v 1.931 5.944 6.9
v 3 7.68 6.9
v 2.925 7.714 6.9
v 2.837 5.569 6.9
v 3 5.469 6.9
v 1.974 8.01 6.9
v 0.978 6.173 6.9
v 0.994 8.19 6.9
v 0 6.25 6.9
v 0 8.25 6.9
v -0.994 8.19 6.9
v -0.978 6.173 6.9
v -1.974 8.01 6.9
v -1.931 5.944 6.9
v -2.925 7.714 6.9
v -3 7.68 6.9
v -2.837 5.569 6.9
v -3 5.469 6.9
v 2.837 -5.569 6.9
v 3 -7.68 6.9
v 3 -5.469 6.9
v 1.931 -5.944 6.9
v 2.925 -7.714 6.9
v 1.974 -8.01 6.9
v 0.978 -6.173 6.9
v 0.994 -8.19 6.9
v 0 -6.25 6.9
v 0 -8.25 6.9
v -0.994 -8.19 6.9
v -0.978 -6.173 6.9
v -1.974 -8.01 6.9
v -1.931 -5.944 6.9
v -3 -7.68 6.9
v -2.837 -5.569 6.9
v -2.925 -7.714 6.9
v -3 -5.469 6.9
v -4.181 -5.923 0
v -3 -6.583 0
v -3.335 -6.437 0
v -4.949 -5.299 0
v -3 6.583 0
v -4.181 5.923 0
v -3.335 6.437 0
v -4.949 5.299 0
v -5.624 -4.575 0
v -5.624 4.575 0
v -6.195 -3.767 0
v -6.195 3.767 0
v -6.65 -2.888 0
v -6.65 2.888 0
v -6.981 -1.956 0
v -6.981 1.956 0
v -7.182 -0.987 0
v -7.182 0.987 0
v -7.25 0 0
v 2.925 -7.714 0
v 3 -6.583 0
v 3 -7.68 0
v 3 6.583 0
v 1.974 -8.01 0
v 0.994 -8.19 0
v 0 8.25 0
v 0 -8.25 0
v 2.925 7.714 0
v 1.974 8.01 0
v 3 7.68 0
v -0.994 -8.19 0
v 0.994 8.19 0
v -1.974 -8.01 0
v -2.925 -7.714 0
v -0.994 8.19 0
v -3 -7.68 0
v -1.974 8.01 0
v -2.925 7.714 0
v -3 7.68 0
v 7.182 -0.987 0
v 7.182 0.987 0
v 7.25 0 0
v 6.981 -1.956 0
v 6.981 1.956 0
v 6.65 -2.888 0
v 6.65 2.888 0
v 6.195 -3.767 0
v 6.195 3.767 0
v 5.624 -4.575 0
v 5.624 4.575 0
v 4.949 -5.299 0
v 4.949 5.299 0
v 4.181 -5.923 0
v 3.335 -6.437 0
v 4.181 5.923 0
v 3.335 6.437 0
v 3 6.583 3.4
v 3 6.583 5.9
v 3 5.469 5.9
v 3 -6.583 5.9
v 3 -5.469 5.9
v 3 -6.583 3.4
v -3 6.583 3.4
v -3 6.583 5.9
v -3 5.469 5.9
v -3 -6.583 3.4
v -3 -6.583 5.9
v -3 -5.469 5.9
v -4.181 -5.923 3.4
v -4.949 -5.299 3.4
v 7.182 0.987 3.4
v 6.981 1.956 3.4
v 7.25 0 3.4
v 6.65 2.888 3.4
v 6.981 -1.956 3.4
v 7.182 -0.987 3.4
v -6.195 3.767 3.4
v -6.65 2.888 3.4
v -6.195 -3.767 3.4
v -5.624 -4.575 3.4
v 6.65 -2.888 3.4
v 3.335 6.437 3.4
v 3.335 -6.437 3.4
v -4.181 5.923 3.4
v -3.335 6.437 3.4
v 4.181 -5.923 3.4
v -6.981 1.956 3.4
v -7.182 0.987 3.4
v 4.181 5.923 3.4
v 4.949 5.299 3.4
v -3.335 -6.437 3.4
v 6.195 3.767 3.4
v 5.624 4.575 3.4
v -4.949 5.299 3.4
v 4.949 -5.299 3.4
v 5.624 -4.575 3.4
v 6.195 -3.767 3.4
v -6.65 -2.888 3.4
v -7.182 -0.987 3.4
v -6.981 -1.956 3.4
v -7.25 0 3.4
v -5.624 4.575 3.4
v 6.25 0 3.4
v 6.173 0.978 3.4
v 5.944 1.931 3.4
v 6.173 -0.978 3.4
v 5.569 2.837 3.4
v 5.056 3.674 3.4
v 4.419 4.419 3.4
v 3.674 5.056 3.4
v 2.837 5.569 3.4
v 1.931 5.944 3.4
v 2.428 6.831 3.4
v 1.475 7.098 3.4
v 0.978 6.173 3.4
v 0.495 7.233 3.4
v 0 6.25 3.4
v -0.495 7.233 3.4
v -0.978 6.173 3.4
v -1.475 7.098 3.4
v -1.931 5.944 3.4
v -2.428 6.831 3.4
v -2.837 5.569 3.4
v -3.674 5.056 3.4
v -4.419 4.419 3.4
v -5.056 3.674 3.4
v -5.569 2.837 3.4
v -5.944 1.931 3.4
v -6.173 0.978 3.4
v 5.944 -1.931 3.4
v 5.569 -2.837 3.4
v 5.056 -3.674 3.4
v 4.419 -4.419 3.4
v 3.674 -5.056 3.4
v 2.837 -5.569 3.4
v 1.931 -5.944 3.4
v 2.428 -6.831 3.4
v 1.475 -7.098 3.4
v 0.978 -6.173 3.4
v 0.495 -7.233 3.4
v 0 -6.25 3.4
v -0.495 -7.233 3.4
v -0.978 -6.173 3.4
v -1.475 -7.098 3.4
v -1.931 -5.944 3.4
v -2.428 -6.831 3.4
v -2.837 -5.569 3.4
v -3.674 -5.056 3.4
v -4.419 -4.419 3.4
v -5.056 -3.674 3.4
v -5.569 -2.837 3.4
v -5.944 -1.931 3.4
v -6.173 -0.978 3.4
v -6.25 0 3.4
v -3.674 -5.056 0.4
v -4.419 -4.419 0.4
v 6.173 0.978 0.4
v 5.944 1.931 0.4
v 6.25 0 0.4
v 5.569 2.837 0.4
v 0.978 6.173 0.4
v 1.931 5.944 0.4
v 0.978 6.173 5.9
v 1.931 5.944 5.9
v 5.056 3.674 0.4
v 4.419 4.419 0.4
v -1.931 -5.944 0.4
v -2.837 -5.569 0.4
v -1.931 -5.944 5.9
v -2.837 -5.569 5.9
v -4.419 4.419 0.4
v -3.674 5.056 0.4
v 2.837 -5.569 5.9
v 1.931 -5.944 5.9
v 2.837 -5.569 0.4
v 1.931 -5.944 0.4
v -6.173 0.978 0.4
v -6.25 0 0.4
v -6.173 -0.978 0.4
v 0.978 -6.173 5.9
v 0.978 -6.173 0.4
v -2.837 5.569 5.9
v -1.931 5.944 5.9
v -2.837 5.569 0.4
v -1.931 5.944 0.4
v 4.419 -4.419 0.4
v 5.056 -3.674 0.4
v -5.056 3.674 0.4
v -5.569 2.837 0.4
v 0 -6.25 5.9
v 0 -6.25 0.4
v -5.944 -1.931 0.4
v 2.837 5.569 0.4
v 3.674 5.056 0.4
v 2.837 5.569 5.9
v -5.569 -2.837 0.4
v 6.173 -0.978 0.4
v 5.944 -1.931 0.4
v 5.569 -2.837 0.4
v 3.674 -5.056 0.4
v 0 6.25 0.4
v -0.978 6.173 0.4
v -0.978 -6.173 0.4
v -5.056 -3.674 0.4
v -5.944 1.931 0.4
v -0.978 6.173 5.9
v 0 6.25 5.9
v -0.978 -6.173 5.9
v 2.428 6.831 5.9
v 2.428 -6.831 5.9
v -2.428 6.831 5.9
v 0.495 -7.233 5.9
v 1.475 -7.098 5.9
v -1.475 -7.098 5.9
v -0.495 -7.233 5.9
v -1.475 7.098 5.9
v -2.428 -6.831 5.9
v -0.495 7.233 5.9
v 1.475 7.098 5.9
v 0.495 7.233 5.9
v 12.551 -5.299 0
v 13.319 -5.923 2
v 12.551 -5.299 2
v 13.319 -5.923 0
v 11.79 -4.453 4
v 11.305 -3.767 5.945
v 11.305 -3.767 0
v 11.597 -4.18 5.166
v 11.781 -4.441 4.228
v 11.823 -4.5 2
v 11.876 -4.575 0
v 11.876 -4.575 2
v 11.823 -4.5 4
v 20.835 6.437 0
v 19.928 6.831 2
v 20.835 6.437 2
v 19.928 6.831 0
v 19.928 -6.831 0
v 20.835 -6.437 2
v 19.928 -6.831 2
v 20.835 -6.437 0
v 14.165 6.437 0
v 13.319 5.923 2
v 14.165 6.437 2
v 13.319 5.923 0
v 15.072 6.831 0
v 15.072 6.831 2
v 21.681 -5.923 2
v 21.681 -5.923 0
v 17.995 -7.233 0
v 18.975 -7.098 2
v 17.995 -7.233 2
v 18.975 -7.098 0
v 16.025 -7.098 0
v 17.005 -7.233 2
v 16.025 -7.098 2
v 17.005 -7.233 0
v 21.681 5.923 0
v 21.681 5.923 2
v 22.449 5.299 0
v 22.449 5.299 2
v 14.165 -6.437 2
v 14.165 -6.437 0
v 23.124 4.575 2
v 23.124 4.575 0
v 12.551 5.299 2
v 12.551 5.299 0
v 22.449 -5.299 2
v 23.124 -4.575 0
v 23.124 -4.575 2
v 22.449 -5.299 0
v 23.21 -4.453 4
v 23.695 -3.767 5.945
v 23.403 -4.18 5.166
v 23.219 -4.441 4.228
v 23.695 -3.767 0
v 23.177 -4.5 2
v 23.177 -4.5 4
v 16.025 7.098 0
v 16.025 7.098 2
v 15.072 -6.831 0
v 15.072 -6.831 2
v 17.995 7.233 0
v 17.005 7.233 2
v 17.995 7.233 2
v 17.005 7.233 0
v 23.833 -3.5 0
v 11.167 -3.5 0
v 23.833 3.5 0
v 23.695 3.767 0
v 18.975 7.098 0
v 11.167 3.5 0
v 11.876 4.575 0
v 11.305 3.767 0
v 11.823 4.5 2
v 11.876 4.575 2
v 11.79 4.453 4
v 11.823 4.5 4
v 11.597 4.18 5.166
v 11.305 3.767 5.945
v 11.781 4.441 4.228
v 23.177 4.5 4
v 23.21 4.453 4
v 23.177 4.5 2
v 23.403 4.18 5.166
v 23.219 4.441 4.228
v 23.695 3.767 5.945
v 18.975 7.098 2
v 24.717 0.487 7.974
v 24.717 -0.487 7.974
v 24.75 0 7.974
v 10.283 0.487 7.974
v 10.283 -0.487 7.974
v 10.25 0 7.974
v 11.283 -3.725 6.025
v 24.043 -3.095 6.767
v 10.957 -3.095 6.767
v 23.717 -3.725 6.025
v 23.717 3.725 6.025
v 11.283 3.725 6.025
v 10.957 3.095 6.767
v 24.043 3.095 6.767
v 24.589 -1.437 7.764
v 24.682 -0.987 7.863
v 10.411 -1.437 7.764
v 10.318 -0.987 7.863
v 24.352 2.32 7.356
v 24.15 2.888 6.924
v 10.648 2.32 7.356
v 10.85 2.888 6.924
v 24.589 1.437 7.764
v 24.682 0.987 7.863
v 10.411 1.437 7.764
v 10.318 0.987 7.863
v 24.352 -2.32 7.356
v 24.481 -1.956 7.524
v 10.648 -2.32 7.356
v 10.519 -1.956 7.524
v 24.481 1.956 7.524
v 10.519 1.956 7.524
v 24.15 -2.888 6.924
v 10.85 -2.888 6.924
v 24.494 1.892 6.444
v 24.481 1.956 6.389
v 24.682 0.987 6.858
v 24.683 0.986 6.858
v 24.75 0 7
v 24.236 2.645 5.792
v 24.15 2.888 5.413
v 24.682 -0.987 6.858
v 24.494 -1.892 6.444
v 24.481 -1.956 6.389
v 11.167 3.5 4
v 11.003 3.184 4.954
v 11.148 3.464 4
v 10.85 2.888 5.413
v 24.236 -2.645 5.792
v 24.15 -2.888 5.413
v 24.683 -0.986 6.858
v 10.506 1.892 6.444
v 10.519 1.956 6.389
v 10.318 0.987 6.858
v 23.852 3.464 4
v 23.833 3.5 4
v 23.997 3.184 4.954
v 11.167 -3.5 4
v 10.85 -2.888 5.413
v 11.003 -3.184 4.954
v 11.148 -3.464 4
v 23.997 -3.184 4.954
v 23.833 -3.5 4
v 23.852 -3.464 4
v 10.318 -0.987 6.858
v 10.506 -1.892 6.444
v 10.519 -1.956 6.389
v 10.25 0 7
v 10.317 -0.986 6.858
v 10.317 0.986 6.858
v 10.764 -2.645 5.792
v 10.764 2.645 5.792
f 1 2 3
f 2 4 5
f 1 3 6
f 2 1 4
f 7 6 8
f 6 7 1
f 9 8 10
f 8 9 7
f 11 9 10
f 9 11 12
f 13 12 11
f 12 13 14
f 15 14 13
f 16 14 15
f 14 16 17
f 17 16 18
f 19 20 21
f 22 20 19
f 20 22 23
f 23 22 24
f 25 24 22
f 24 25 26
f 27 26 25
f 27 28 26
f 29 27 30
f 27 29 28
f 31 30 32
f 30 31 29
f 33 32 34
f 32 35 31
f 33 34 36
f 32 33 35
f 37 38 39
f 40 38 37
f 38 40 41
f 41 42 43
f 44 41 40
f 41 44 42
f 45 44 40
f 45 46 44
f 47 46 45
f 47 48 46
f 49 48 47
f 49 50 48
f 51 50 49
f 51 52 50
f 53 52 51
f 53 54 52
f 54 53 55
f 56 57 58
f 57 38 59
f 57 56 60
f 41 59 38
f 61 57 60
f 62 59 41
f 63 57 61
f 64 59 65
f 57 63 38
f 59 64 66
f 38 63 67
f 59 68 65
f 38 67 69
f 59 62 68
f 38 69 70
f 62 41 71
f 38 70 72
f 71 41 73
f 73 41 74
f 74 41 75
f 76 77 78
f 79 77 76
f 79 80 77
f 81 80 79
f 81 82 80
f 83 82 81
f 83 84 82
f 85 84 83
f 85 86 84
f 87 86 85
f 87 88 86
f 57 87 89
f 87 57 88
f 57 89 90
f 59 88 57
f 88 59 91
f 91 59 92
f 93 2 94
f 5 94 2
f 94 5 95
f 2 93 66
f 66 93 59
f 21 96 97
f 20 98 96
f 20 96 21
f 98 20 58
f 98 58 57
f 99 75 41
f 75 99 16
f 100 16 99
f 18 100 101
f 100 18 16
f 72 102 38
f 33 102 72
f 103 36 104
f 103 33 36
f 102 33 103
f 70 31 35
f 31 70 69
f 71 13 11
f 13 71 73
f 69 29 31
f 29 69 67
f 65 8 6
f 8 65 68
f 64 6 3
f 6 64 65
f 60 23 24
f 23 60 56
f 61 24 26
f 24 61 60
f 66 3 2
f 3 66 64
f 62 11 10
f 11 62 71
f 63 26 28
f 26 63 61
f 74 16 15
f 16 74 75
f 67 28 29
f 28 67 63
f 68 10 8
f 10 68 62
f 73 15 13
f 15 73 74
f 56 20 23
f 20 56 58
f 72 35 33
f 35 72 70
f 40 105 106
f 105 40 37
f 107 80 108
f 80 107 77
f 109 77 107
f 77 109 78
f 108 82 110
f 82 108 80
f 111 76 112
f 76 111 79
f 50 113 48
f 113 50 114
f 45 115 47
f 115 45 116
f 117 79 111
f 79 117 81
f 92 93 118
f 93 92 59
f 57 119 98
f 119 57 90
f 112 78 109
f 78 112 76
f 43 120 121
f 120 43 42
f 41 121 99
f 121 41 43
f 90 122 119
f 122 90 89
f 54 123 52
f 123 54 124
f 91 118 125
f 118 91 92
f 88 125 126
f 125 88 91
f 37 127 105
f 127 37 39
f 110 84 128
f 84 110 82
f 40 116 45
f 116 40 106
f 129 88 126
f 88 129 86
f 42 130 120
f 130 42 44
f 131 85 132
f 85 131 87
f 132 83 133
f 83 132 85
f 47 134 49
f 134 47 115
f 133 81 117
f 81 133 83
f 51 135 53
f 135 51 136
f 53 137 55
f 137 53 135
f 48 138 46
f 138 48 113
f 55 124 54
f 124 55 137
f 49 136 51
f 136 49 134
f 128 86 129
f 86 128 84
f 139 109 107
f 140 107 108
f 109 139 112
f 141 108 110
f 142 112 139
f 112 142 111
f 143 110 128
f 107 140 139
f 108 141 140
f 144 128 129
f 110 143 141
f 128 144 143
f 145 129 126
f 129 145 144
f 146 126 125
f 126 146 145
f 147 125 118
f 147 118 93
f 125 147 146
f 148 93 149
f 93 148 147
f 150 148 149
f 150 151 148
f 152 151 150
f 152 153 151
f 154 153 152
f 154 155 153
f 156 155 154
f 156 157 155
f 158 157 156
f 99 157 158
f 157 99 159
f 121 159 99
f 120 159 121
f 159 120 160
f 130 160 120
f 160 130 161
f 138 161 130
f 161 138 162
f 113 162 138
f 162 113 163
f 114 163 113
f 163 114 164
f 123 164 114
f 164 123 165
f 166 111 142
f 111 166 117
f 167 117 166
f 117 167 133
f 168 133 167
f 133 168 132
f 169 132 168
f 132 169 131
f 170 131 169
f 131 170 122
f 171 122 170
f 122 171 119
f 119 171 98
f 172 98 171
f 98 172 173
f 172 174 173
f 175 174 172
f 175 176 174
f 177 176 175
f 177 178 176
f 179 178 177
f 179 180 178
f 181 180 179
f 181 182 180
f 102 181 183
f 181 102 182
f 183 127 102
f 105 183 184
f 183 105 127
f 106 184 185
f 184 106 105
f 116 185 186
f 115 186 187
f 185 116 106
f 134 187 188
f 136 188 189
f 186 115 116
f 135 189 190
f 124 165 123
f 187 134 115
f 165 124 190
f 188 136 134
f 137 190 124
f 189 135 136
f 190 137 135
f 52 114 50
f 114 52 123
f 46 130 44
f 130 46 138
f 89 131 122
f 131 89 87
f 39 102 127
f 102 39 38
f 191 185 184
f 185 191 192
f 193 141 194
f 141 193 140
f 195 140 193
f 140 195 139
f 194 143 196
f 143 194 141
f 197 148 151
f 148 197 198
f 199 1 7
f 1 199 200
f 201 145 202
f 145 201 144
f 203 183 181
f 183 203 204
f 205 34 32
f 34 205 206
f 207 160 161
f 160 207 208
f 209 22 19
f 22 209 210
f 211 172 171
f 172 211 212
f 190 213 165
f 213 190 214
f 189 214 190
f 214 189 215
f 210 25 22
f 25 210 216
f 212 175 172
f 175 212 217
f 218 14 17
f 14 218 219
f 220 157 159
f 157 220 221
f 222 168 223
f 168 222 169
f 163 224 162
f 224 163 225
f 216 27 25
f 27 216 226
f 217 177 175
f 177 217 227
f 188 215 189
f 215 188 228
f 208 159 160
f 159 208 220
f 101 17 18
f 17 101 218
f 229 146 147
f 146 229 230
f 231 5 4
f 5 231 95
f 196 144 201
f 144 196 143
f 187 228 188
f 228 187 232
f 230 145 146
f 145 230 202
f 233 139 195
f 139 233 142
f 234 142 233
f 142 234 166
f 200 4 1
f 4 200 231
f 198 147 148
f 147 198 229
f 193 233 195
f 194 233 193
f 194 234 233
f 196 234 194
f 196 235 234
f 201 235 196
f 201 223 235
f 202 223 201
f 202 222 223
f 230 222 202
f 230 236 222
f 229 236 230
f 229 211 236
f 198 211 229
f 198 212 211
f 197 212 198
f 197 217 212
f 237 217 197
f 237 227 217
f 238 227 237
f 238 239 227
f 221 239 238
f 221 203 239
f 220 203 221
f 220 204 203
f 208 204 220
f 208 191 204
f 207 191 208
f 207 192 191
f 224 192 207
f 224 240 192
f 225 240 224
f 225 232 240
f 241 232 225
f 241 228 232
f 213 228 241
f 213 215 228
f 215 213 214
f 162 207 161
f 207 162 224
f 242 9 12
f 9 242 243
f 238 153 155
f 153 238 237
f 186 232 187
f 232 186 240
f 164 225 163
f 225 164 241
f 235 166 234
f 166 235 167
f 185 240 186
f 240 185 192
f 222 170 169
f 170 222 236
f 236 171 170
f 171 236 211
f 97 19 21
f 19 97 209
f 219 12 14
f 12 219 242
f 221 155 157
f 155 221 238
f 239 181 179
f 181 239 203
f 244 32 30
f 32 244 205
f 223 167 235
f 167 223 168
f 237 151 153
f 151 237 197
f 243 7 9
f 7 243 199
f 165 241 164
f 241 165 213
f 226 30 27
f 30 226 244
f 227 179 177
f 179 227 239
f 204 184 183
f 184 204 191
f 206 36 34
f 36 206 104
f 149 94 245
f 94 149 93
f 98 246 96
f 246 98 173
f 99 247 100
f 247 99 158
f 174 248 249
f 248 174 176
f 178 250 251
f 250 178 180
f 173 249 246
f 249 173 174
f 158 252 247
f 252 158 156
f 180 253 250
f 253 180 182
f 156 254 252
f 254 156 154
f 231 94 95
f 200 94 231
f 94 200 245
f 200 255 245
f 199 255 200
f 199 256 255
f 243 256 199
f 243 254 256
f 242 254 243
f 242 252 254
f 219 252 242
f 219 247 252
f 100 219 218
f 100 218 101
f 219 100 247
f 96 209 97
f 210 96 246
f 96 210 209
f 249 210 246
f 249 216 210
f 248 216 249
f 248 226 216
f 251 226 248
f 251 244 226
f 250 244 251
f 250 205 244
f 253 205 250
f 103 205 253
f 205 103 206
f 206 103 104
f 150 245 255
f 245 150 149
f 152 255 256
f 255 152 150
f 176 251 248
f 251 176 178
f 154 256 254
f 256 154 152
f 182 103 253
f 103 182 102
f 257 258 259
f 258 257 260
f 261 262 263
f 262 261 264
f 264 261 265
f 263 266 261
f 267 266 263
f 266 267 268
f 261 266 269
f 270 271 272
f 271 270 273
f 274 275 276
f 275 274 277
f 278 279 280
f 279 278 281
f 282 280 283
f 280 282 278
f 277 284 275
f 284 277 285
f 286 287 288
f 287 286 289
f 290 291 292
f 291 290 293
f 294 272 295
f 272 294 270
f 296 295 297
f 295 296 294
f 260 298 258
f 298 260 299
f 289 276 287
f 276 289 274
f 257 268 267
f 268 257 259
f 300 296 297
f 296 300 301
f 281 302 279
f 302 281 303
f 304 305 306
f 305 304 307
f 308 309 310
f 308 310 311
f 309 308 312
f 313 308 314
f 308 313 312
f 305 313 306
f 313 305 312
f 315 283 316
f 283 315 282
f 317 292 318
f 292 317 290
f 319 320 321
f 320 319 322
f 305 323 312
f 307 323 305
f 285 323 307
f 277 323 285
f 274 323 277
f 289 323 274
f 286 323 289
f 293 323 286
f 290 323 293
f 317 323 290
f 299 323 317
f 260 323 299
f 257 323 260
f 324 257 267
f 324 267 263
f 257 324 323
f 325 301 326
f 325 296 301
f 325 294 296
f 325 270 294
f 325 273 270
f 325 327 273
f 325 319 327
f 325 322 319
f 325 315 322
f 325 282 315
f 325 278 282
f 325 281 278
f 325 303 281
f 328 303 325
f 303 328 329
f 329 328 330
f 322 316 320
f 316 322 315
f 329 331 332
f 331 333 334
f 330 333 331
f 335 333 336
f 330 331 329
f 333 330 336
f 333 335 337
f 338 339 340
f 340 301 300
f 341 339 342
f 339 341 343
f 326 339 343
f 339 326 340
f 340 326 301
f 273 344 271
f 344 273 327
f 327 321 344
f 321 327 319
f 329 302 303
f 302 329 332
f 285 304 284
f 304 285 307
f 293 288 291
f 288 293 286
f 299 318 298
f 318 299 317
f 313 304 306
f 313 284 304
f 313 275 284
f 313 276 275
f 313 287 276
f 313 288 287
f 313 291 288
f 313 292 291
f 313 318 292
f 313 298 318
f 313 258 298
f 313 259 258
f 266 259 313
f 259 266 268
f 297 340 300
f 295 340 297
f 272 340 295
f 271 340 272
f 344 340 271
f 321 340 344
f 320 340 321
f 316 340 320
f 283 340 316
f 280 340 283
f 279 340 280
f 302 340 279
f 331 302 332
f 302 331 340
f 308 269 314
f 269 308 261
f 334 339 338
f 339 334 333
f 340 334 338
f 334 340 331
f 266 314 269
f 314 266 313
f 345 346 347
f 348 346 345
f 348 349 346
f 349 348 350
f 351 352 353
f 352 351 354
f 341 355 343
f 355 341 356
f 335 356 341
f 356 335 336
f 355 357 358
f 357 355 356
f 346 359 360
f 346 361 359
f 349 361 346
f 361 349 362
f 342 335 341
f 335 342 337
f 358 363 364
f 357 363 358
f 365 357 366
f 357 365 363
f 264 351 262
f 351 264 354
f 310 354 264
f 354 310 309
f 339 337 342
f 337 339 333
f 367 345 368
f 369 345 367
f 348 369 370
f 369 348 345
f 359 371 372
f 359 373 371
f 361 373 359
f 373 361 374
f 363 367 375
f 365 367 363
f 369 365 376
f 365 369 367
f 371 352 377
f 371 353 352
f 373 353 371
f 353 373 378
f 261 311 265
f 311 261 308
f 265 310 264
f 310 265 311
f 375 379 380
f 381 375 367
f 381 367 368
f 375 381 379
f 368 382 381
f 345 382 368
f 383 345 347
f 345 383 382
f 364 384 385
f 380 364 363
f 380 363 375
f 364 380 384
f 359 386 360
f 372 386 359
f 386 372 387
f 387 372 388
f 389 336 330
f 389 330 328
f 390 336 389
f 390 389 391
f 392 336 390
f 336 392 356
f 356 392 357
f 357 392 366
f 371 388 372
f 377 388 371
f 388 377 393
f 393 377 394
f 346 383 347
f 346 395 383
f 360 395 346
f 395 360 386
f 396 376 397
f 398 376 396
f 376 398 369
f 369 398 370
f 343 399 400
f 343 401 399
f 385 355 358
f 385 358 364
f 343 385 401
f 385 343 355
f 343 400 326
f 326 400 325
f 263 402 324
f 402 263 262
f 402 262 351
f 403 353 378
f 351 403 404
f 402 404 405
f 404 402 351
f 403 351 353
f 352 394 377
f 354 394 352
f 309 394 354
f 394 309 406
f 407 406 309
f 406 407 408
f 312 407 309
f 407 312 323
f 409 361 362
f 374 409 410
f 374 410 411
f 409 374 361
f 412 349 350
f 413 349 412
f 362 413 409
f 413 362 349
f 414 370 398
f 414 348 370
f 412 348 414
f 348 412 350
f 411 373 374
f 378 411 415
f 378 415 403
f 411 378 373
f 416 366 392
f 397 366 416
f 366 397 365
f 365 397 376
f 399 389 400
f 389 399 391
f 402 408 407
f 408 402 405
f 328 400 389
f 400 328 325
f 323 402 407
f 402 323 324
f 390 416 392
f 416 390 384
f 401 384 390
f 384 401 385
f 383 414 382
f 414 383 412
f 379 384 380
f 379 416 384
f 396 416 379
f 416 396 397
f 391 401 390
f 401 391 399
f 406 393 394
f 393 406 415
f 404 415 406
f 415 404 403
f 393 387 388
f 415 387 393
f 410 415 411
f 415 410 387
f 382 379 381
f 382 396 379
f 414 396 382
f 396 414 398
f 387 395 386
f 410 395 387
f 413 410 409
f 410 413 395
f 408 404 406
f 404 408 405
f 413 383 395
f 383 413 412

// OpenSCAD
// Diameter of your magnet
Magnet_Diameter = 12.5;

// Thickness of your magnet
Magnet_Thickness = 3;

// Diameter of your cable
Cable_Diameter = 7;

// Thickness of the bottom layer holding the magnet. The default should be fine.
Bottom_Thickness = 0.4;

// Thickness of top cover. The default should be fine.
Cover_Thickness = 2;

// Increase clearance if the two parts can't fit, reduce if it's too loose.
Top_Clearance = 0.5;

/* [Hidden] */
$fs = 1;
$fa = 6;

Magnet_Radius = Magnet_Diameter / 2;
Cable_Radius = Cable_Diameter / 2;



module copy_mirror(vec=[0,1,0]) {
 union() {
  children();
  mirror(vec) children();
 }
};

difference() {
    union() {
        cylinder(r=Magnet_Radius+1, h=Magnet_Thickness+Bottom_Thickness);
        difference() {
            cylinder(r=Magnet_Radius+2, h=Magnet_Thickness+Bottom_Thickness+Cover_Thickness+1+Top_Clearance);
            copy_mirror([1,0,0]) translate([3,-(Magnet_Diameter+6)/2,0]) cube([Magnet_Radius+3, Magnet_Diameter+6, Magnet_Thickness+Bottom_Thickness+Cover_Thickness+1+Top_Clearance]);
        }
    }
    translate([0,0,Bottom_Thickness]) cylinder(r=Magnet_Radius, h=Magnet_Thickness+Cover_Thickness+1+Top_Clearance);
    translate([0,0,Magnet_Thickness+Bottom_Thickness]) cylinder(r=Magnet_Radius+1, h=Cover_Thickness+Top_Clearance);
}

//color("green") translate([0,0,Magnet_Thickness+Bottom_Thickness]) {
color("green") translate([Magnet_Diameter+5,0,0]) {
    difference() {
        intersection() {
            union() {
                cylinder(r=Magnet_Radius+1, h=Cover_Thickness);
                translate([-(Magnet_Diameter+2)/2, -(Cable_Diameter+2)/2, 0]) cube([Magnet_Diameter+2, Cable_Diameter+2, (Cable_Diameter+1)/2]);
                translate([0,0,Cable_Radius]) rotate([0,90,0])cylinder(r=Cable_Radius+1, h=Magnet_Diameter+2, center=true);
            }
            cylinder(r=Magnet_Radius+1, h=Cable_Diameter+1);
        }
        translate([-(Magnet_Diameter+2)/2, -Cable_Radius, 0]) cube([Magnet_Diameter+2, Cable_Diameter, (Cable_Diameter+1)/2]);
        translate([0,0,Cable_Radius]) rotate([0,90,0])cylinder(r=Cable_Radius, h=Magnet_Diameter+2, center=true);
        translate([0,0,-1]) cylinder(r=Magnet_Radius+1, h=1);
    }
}
